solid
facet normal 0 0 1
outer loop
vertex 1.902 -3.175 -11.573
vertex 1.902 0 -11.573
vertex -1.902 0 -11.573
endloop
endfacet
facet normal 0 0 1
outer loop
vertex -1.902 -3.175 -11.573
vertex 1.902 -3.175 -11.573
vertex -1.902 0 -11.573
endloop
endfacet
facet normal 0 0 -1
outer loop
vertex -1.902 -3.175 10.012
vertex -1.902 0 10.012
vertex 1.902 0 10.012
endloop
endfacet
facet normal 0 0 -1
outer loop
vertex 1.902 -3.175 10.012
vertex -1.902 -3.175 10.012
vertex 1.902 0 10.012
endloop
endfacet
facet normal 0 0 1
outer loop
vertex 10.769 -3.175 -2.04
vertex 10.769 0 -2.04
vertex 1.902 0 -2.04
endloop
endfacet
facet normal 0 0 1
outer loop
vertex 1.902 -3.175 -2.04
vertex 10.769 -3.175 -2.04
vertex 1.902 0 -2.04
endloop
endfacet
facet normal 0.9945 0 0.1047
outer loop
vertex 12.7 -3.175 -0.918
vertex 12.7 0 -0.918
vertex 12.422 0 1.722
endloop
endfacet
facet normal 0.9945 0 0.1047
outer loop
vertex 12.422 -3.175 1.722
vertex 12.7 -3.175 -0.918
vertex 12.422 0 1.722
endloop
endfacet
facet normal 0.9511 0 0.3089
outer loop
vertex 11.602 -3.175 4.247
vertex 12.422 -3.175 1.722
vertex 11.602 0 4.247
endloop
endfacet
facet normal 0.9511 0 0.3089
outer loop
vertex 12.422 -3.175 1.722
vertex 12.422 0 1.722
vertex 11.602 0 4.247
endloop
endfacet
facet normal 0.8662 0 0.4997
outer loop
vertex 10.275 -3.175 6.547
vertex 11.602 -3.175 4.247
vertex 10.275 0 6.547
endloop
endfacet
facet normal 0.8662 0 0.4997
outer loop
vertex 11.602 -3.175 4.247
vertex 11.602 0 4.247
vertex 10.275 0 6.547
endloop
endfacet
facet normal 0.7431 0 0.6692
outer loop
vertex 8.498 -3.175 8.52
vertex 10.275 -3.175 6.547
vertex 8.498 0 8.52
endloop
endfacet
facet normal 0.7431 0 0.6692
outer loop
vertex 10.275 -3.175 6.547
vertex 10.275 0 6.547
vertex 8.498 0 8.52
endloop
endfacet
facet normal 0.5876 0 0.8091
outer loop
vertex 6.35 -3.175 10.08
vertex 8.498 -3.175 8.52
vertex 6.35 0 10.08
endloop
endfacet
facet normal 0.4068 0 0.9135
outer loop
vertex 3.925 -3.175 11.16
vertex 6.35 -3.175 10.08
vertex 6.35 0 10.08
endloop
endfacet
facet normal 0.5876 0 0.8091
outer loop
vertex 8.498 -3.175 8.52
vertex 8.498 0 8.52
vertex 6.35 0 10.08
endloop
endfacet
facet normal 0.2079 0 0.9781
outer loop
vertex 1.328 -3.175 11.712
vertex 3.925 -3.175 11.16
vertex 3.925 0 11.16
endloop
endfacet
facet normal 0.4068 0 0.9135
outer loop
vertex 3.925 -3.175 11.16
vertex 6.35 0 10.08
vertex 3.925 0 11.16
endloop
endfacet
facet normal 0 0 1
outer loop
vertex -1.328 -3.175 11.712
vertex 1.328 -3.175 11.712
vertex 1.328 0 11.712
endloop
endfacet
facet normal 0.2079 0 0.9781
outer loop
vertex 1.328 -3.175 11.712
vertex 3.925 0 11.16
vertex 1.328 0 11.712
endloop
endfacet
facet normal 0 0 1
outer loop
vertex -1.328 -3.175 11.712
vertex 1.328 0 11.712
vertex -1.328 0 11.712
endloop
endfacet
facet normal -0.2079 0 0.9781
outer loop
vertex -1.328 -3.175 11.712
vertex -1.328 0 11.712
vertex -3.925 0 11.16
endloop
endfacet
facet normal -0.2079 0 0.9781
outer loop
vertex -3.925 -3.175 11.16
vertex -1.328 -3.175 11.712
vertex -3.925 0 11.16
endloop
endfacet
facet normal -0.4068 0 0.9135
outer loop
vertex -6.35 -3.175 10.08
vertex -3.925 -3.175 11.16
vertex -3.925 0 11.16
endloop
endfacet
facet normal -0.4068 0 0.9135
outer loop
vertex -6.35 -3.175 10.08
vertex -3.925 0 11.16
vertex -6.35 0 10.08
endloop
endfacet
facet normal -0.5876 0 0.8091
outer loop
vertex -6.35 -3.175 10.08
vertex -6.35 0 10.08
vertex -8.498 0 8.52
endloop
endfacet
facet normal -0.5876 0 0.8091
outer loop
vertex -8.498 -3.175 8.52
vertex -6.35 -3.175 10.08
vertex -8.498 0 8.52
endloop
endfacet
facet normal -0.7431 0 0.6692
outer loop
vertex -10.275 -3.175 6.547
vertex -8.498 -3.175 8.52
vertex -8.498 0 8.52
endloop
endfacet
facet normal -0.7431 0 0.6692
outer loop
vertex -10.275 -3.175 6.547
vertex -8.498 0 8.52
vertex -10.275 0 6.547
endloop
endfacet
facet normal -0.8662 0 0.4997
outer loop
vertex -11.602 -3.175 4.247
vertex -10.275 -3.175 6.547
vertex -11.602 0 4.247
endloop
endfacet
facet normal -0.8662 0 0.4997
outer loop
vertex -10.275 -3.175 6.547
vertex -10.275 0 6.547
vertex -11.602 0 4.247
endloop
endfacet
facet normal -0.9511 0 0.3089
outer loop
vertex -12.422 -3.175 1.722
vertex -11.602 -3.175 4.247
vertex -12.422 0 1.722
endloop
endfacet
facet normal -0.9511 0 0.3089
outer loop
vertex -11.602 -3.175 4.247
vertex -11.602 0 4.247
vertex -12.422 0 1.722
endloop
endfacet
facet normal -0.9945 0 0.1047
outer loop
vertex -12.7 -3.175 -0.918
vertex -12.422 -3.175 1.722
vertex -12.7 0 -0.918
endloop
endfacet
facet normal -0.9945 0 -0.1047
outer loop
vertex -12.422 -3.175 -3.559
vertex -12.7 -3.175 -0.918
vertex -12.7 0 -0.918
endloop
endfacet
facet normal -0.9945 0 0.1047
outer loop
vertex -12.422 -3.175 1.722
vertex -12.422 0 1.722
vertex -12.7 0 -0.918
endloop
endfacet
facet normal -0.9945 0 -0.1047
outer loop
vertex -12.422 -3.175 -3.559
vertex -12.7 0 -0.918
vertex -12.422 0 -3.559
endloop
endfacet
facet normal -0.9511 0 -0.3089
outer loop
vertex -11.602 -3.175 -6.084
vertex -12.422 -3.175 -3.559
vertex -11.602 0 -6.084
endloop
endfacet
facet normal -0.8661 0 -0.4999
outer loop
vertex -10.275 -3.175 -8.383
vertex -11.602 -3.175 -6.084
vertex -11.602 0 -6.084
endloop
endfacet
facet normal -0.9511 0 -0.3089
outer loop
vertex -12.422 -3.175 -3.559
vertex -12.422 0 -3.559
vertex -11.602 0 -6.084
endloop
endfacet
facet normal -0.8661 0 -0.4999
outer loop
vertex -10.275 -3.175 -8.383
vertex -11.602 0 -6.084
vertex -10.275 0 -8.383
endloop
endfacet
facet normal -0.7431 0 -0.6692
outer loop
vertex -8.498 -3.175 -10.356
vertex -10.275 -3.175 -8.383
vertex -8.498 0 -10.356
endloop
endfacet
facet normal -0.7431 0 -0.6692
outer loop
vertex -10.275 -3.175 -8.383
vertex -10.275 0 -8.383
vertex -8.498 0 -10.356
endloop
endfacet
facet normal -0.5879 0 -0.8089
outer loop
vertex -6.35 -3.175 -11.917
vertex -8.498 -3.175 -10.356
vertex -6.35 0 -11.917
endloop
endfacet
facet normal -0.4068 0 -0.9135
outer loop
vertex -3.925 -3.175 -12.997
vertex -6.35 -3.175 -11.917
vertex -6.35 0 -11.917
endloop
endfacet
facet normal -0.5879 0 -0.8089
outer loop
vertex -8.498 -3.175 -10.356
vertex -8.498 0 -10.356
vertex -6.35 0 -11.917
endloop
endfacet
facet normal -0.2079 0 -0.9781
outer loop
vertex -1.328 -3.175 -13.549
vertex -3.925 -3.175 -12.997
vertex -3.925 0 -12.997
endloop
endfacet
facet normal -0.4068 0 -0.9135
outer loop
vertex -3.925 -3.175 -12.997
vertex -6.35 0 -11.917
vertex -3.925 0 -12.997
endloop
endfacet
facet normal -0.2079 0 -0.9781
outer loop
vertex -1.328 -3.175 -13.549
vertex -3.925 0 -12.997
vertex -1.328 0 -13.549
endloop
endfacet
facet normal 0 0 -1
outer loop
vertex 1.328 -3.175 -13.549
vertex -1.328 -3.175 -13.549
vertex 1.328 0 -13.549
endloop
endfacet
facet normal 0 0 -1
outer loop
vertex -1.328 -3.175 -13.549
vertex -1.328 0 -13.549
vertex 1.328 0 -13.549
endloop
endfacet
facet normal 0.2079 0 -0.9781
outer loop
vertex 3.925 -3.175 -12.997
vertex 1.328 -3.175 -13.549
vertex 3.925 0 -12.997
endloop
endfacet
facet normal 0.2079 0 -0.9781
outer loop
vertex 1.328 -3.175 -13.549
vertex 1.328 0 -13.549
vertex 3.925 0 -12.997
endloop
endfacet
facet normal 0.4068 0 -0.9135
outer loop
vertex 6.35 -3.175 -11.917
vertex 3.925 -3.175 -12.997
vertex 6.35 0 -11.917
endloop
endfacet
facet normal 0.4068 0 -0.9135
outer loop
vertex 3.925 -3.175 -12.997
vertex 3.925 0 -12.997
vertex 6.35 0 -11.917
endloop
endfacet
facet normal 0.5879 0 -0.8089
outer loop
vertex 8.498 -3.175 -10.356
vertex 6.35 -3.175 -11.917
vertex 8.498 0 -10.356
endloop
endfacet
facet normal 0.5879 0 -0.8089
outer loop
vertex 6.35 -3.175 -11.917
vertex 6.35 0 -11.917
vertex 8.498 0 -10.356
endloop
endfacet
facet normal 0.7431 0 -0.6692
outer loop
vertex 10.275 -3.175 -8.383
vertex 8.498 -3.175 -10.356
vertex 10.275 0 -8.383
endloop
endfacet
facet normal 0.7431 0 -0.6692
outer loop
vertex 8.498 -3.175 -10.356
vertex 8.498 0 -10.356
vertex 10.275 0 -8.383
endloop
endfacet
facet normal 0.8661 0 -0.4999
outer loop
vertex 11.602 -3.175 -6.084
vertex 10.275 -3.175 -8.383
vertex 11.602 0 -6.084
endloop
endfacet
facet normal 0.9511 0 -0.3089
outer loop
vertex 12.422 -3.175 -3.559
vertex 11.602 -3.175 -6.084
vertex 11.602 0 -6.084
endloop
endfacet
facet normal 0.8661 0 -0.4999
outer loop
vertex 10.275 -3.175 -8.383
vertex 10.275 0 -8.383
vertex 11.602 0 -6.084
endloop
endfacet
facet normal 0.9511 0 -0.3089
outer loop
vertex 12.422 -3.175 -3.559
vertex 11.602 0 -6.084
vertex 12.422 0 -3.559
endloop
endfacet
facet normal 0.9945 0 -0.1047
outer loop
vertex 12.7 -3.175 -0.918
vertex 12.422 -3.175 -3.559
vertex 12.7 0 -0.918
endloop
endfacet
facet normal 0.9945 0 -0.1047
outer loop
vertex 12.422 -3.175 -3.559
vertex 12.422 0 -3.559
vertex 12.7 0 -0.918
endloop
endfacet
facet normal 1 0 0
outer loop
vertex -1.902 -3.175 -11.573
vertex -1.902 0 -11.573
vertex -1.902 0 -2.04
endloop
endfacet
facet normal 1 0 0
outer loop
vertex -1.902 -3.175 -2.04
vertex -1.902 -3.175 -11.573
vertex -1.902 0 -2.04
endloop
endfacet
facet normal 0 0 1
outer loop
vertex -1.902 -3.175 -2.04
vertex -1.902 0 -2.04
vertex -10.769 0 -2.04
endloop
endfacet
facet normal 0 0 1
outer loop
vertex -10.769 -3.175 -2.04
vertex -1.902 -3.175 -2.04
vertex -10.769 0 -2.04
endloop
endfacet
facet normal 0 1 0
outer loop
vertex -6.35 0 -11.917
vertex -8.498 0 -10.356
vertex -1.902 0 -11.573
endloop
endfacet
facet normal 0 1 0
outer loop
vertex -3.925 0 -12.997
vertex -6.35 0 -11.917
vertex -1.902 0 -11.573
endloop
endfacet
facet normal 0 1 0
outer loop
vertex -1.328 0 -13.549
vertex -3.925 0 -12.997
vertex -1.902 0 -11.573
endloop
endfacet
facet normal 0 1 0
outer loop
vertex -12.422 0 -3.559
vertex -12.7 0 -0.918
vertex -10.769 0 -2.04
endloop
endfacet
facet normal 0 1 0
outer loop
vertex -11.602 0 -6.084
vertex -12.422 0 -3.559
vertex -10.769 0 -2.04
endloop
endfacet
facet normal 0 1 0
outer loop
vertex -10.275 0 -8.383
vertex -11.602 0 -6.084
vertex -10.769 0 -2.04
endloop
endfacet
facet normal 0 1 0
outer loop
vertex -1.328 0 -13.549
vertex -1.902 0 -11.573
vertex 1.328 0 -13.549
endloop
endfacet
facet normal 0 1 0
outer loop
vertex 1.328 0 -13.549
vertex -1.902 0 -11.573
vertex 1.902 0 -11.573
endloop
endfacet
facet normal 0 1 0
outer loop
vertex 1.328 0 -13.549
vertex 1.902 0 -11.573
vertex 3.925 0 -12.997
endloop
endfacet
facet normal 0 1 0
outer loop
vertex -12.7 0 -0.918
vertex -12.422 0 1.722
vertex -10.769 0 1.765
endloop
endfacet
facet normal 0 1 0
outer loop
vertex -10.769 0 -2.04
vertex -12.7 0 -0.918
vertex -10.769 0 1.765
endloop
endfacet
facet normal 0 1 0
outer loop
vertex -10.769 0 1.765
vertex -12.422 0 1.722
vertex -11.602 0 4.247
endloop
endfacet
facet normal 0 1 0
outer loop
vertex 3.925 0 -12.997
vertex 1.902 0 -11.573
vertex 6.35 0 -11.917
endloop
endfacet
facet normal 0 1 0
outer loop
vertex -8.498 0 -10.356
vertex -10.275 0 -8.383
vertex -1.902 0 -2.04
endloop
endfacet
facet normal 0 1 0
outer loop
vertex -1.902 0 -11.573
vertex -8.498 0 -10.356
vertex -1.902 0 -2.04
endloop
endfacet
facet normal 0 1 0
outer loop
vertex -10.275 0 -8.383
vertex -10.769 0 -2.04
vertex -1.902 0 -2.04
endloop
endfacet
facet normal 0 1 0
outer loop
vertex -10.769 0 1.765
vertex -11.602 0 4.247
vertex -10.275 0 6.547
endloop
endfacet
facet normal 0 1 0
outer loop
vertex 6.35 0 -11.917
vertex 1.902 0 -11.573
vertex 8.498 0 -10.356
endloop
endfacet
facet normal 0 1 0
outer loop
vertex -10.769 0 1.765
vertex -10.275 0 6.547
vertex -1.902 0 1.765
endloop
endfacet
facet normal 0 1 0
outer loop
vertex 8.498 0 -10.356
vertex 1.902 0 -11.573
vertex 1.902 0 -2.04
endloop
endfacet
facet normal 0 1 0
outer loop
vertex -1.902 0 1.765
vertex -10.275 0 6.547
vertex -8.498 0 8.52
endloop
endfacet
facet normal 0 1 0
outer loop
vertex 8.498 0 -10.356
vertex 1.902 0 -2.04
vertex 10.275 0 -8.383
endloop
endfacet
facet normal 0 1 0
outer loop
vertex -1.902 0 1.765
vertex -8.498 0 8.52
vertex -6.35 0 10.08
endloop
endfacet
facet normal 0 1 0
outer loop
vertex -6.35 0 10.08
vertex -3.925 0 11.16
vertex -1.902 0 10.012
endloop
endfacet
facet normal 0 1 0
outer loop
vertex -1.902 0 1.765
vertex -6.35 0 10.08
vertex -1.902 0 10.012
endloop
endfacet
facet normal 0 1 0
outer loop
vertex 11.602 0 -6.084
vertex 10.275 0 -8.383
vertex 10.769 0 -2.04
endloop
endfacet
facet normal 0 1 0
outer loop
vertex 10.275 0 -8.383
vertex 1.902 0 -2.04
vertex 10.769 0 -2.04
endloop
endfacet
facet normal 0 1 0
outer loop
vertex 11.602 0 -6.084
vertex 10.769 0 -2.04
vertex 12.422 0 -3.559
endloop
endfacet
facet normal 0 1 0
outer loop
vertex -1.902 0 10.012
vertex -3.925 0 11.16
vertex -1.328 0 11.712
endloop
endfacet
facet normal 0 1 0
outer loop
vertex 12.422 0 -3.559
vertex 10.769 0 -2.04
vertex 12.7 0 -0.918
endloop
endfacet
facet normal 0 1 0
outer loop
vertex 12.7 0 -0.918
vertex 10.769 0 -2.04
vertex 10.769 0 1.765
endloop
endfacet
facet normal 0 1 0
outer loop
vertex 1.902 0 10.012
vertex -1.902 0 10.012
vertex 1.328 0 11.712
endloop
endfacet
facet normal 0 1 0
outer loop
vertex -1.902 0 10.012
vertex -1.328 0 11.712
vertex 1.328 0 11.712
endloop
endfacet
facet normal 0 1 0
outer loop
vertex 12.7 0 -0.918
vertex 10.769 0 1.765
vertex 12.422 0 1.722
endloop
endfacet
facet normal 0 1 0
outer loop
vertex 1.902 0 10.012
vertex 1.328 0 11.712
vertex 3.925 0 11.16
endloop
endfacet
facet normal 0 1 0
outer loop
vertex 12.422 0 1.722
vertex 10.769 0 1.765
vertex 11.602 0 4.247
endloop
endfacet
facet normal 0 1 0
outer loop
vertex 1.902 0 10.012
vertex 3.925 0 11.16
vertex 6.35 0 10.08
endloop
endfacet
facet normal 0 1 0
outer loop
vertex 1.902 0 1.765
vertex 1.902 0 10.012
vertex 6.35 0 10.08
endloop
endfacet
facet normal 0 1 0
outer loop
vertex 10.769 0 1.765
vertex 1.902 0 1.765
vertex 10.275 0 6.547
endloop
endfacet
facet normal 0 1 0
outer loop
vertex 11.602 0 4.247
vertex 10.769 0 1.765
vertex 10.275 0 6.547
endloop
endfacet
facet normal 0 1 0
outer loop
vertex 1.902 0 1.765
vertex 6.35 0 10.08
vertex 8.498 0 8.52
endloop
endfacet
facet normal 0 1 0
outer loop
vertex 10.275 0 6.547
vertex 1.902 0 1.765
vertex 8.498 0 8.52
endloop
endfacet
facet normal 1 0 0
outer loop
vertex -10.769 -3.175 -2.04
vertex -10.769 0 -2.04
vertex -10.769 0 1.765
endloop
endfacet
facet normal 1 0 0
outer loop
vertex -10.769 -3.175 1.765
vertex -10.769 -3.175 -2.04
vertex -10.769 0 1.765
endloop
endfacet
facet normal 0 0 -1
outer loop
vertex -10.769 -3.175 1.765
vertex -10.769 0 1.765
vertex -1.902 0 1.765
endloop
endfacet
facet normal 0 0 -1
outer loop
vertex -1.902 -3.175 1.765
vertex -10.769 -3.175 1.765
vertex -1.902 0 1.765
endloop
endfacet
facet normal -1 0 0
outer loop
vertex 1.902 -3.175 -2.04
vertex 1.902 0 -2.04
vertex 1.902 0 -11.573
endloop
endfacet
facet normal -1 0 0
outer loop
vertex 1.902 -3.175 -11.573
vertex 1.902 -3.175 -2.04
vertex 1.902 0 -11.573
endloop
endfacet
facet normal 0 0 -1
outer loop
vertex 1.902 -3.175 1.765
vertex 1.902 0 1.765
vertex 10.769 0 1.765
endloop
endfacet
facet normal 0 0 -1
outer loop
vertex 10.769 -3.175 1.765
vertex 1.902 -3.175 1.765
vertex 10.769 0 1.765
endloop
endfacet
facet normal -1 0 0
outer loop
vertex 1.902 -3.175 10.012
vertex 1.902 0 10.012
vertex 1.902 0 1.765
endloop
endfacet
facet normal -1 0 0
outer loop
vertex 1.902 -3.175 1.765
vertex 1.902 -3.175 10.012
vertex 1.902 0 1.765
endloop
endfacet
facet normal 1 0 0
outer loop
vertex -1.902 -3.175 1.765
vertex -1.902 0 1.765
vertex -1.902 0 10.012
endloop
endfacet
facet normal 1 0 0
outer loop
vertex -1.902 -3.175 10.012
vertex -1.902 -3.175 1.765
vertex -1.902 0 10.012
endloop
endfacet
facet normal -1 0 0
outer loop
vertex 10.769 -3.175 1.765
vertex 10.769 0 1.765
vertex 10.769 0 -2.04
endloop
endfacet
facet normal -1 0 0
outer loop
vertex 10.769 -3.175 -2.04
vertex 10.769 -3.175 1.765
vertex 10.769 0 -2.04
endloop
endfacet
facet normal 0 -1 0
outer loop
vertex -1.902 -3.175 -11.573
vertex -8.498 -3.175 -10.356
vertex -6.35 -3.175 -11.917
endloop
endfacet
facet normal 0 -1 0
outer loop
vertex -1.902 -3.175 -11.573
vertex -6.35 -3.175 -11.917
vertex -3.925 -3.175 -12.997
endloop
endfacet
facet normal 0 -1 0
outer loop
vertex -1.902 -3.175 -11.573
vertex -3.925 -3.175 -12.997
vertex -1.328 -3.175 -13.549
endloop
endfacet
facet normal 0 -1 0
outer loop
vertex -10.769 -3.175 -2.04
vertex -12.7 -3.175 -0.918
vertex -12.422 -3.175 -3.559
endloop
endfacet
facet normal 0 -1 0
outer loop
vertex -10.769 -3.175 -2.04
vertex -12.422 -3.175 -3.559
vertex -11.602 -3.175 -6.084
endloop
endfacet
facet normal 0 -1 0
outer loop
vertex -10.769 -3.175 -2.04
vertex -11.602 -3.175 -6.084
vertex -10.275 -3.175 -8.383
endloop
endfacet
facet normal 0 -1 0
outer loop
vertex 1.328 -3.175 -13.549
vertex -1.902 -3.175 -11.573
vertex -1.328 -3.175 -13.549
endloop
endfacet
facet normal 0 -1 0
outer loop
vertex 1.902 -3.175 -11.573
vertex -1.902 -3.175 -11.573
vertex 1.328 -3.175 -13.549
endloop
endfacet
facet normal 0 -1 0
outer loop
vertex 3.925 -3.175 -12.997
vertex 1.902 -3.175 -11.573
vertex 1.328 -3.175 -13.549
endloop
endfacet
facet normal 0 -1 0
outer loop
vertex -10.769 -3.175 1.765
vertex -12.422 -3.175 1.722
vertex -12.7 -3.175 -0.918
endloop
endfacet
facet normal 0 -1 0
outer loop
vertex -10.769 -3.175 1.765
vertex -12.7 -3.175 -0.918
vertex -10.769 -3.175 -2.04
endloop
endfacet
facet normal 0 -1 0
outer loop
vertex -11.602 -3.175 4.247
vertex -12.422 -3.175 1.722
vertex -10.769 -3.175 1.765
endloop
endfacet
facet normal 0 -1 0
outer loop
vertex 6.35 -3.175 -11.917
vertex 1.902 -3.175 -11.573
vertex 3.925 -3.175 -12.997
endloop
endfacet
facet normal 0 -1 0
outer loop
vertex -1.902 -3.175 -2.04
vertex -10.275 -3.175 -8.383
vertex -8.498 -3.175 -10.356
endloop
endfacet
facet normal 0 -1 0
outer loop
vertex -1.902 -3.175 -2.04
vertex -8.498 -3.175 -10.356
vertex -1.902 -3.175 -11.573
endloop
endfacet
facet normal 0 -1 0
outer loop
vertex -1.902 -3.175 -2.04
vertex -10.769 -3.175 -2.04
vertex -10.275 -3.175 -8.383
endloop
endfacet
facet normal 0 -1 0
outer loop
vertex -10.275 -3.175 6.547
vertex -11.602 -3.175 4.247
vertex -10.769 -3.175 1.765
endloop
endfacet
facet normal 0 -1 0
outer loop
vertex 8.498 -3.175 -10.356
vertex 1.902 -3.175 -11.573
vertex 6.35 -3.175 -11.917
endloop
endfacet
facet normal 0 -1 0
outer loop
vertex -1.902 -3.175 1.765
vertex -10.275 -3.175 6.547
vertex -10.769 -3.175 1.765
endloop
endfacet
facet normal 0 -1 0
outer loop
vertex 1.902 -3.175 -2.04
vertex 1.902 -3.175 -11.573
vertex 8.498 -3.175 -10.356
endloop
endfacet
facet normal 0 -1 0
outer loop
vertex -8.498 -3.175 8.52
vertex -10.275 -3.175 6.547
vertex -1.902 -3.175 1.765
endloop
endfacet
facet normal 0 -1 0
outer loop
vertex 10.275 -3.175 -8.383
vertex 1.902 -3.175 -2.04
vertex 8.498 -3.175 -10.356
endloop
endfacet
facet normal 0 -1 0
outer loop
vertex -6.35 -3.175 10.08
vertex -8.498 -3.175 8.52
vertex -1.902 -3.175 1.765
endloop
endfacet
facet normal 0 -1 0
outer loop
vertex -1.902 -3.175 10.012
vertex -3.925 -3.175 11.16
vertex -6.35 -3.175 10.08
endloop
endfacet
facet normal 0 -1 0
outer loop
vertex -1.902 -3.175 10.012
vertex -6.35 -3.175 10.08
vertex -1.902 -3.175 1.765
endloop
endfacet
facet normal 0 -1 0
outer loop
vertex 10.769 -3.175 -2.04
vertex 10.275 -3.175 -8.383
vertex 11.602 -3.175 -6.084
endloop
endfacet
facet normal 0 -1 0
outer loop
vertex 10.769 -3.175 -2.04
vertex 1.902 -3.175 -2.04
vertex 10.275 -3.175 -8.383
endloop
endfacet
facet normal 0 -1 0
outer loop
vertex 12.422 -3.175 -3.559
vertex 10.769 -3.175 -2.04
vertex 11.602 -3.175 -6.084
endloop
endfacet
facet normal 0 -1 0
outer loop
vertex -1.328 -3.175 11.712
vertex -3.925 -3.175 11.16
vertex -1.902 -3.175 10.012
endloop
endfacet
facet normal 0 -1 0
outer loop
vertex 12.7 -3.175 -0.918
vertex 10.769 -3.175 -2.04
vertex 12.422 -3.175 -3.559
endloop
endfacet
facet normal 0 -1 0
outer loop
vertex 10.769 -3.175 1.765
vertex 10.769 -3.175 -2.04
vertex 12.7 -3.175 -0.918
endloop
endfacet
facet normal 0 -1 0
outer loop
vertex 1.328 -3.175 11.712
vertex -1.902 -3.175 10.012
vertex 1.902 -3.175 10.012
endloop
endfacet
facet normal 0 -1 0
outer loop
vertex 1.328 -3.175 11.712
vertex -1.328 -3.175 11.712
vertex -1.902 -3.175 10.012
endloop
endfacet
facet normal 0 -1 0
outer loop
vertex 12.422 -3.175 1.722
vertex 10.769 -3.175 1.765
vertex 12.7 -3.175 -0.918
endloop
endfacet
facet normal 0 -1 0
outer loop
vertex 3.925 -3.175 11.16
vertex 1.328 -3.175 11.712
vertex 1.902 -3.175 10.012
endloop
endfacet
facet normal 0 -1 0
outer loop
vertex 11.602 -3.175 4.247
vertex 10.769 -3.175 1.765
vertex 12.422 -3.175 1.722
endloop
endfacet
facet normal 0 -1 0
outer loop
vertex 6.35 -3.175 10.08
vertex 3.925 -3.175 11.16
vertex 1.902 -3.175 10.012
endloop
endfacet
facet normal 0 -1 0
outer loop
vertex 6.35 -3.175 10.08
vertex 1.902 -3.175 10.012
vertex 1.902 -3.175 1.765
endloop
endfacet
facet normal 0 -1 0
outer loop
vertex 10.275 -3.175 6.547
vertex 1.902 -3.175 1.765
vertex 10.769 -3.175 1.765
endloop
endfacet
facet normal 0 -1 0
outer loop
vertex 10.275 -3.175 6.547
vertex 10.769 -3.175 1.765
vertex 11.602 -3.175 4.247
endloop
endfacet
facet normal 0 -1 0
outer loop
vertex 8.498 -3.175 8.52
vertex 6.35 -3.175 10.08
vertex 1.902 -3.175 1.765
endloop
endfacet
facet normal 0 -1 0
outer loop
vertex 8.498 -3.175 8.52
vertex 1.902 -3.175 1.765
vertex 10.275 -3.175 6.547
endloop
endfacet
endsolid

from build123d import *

# Parameters (mm, degrees)
F0_R     = 12.7
F1_DEPTH = 3.175


with BuildPart() as f1:
    # F0 (on Front) → F1 (new body)
    with BuildSketch(Plane.XZ):
        with Locations((0, -0.918301)):
            Circle(F0_R)
        Polygon((-10.76945, -2.039835), (-10.76945, 1.764737), (-1.902286, 1.764737), (-1.902286, 10.01233), (1.902286, 10.01233), (1.902286, 1.764737), (10.76945, 1.764737), (10.76945, -2.039835), (1.902286, -2.039835), (1.902286, -11.573113), (-1.902286, -11.573113), (-1.902286, -2.039835), align=None, mode=Mode.SUBTRACT)
    extrude(amount=F1_DEPTH)


solid = f1.part
